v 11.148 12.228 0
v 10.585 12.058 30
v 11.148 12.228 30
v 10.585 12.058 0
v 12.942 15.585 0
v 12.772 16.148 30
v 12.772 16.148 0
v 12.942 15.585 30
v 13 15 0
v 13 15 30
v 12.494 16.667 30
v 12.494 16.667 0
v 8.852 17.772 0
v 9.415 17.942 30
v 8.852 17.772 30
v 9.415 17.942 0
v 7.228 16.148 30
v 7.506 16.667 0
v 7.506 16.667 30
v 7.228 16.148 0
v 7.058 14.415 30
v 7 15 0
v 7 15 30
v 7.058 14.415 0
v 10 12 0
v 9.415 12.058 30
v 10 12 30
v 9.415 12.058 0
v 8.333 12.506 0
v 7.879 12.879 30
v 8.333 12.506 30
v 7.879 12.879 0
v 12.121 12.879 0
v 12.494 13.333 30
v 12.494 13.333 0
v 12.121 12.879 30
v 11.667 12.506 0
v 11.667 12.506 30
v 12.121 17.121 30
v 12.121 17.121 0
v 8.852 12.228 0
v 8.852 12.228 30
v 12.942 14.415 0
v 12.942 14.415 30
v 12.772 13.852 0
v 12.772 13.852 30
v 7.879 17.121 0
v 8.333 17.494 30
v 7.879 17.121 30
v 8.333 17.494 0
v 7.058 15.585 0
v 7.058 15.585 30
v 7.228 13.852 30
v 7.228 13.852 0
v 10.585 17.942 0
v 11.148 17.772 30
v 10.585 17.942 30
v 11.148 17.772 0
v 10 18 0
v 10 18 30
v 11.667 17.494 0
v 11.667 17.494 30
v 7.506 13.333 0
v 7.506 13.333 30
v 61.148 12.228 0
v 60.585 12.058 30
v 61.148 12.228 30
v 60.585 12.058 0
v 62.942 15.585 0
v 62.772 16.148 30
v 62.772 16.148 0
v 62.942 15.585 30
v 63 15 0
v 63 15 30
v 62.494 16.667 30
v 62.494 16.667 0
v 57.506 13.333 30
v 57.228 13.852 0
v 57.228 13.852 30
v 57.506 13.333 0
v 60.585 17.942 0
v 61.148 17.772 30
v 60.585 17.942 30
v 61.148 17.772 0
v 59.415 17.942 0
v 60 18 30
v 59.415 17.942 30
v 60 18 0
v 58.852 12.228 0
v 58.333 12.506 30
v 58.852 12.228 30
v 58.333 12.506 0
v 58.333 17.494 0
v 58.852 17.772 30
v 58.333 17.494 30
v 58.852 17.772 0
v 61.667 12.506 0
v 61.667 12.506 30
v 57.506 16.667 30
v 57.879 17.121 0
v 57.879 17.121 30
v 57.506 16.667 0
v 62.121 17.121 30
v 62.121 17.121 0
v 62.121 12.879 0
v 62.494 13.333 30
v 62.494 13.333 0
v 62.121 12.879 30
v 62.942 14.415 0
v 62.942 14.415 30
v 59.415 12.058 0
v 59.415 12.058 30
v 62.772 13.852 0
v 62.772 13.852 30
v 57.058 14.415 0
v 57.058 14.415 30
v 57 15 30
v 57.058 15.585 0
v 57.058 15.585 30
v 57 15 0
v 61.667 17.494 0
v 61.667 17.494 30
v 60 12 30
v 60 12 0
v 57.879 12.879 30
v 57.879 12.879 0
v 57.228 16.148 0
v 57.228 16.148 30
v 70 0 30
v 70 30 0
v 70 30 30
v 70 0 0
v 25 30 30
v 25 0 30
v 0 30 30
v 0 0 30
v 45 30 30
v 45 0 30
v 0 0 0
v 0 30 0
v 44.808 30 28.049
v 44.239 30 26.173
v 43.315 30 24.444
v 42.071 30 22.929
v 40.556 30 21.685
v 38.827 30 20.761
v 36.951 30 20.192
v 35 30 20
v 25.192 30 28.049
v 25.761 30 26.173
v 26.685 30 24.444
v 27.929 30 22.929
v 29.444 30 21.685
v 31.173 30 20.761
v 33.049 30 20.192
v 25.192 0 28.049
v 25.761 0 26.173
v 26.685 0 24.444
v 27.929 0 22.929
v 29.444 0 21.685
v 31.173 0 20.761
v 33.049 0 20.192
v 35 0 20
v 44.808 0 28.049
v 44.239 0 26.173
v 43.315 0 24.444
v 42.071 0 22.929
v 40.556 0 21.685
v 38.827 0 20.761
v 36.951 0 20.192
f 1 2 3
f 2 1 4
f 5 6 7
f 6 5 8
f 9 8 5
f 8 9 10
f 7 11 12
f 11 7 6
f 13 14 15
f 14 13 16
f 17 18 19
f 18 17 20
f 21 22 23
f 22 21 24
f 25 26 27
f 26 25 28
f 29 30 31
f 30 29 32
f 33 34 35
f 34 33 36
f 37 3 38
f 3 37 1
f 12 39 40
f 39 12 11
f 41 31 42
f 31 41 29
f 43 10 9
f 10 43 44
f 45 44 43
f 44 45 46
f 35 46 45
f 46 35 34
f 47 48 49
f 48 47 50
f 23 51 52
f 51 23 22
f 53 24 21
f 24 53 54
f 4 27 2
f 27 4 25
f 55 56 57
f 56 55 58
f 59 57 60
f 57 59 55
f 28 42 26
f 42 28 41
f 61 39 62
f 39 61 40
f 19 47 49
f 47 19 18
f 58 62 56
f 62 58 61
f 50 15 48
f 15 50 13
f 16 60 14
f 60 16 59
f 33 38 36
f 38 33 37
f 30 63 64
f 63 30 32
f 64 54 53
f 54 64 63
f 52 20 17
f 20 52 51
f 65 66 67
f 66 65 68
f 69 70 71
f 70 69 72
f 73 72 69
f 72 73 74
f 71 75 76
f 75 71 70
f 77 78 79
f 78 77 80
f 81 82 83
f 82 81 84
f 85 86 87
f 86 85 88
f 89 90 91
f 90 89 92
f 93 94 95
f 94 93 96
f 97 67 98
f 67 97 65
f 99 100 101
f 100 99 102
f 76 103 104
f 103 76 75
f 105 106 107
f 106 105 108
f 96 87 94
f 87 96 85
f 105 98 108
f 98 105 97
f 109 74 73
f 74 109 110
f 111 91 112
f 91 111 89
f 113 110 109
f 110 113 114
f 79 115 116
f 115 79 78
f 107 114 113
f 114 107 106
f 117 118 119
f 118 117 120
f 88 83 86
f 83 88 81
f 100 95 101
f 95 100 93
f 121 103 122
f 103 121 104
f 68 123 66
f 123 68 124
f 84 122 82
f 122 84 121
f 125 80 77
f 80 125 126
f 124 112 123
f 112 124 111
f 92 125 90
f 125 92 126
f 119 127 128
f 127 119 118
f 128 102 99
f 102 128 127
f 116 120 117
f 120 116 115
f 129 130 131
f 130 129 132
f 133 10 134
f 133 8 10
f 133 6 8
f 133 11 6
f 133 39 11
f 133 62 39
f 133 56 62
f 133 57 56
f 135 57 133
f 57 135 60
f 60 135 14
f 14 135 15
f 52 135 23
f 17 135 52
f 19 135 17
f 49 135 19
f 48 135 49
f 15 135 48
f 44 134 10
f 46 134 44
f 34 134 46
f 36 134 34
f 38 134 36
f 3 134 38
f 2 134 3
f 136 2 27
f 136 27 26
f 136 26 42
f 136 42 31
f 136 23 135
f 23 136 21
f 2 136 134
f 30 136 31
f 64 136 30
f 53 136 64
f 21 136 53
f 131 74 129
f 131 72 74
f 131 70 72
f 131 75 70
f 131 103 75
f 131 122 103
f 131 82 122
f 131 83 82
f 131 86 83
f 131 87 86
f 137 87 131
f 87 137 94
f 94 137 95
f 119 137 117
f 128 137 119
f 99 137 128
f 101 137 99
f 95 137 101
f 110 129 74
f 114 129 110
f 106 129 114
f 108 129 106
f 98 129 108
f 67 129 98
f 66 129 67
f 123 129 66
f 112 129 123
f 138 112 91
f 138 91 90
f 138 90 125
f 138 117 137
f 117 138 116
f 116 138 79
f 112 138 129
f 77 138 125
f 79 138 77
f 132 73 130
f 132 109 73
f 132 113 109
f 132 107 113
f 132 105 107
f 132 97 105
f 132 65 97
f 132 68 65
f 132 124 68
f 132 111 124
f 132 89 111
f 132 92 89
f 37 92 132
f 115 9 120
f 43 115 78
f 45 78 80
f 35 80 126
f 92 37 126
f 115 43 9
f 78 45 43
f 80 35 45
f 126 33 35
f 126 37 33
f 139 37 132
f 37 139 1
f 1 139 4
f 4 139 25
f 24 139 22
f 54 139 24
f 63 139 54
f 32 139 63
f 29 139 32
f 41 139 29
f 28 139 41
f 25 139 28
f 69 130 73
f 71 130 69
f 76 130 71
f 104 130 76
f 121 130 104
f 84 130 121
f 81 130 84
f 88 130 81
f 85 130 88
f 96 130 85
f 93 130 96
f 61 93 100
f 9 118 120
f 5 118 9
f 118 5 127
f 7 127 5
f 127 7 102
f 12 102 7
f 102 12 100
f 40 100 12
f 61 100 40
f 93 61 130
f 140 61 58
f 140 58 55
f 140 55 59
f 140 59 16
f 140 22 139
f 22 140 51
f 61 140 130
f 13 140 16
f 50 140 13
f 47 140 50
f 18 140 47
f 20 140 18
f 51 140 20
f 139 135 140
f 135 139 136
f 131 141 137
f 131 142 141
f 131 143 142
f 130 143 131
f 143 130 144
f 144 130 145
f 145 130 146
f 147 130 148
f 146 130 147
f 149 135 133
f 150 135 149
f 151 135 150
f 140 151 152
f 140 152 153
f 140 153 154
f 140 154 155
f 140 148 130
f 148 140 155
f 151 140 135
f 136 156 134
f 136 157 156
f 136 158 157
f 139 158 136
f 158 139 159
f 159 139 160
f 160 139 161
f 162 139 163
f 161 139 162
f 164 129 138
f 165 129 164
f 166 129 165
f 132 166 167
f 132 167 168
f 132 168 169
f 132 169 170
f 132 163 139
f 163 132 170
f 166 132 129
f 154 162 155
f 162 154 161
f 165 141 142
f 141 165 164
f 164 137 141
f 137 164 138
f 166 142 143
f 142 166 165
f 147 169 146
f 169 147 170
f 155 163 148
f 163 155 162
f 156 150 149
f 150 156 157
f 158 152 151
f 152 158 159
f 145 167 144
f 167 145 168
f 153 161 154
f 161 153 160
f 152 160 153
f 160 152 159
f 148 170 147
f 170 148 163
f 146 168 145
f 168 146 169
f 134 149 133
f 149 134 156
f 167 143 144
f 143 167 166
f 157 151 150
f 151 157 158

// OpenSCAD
$fn = 32;

// ----------------------------------------------------------------------
// Saddle clamp: plain shaft clamp
// ----------------------------------------------------------------------

// --- parameters (mm) ---
blk_l = 70;               // block length, X
blk_w = 30;               // block width, Y
blk_h = 30;               // block height
clamp_r = 10;             // shaft groove radius
hole_r = 3;               // bolt hole radius
hole_m = 10;              // bolt hole margin from the ends

saw_depth = clamp_r + 3;  // saw kerf depth

difference() {
  cube([blk_l, blk_w, blk_h]);
  translate([blk_l / 2, -1, blk_h])
    rotate([-90, 0, 0])
      cylinder(h = blk_w + 2, r = clamp_r);
  for (sx = [0, 1])
    translate([sx ? blk_l - hole_m : hole_m, blk_w / 2, -1])
      cylinder(r = hole_r, h = blk_h + 2);
}
